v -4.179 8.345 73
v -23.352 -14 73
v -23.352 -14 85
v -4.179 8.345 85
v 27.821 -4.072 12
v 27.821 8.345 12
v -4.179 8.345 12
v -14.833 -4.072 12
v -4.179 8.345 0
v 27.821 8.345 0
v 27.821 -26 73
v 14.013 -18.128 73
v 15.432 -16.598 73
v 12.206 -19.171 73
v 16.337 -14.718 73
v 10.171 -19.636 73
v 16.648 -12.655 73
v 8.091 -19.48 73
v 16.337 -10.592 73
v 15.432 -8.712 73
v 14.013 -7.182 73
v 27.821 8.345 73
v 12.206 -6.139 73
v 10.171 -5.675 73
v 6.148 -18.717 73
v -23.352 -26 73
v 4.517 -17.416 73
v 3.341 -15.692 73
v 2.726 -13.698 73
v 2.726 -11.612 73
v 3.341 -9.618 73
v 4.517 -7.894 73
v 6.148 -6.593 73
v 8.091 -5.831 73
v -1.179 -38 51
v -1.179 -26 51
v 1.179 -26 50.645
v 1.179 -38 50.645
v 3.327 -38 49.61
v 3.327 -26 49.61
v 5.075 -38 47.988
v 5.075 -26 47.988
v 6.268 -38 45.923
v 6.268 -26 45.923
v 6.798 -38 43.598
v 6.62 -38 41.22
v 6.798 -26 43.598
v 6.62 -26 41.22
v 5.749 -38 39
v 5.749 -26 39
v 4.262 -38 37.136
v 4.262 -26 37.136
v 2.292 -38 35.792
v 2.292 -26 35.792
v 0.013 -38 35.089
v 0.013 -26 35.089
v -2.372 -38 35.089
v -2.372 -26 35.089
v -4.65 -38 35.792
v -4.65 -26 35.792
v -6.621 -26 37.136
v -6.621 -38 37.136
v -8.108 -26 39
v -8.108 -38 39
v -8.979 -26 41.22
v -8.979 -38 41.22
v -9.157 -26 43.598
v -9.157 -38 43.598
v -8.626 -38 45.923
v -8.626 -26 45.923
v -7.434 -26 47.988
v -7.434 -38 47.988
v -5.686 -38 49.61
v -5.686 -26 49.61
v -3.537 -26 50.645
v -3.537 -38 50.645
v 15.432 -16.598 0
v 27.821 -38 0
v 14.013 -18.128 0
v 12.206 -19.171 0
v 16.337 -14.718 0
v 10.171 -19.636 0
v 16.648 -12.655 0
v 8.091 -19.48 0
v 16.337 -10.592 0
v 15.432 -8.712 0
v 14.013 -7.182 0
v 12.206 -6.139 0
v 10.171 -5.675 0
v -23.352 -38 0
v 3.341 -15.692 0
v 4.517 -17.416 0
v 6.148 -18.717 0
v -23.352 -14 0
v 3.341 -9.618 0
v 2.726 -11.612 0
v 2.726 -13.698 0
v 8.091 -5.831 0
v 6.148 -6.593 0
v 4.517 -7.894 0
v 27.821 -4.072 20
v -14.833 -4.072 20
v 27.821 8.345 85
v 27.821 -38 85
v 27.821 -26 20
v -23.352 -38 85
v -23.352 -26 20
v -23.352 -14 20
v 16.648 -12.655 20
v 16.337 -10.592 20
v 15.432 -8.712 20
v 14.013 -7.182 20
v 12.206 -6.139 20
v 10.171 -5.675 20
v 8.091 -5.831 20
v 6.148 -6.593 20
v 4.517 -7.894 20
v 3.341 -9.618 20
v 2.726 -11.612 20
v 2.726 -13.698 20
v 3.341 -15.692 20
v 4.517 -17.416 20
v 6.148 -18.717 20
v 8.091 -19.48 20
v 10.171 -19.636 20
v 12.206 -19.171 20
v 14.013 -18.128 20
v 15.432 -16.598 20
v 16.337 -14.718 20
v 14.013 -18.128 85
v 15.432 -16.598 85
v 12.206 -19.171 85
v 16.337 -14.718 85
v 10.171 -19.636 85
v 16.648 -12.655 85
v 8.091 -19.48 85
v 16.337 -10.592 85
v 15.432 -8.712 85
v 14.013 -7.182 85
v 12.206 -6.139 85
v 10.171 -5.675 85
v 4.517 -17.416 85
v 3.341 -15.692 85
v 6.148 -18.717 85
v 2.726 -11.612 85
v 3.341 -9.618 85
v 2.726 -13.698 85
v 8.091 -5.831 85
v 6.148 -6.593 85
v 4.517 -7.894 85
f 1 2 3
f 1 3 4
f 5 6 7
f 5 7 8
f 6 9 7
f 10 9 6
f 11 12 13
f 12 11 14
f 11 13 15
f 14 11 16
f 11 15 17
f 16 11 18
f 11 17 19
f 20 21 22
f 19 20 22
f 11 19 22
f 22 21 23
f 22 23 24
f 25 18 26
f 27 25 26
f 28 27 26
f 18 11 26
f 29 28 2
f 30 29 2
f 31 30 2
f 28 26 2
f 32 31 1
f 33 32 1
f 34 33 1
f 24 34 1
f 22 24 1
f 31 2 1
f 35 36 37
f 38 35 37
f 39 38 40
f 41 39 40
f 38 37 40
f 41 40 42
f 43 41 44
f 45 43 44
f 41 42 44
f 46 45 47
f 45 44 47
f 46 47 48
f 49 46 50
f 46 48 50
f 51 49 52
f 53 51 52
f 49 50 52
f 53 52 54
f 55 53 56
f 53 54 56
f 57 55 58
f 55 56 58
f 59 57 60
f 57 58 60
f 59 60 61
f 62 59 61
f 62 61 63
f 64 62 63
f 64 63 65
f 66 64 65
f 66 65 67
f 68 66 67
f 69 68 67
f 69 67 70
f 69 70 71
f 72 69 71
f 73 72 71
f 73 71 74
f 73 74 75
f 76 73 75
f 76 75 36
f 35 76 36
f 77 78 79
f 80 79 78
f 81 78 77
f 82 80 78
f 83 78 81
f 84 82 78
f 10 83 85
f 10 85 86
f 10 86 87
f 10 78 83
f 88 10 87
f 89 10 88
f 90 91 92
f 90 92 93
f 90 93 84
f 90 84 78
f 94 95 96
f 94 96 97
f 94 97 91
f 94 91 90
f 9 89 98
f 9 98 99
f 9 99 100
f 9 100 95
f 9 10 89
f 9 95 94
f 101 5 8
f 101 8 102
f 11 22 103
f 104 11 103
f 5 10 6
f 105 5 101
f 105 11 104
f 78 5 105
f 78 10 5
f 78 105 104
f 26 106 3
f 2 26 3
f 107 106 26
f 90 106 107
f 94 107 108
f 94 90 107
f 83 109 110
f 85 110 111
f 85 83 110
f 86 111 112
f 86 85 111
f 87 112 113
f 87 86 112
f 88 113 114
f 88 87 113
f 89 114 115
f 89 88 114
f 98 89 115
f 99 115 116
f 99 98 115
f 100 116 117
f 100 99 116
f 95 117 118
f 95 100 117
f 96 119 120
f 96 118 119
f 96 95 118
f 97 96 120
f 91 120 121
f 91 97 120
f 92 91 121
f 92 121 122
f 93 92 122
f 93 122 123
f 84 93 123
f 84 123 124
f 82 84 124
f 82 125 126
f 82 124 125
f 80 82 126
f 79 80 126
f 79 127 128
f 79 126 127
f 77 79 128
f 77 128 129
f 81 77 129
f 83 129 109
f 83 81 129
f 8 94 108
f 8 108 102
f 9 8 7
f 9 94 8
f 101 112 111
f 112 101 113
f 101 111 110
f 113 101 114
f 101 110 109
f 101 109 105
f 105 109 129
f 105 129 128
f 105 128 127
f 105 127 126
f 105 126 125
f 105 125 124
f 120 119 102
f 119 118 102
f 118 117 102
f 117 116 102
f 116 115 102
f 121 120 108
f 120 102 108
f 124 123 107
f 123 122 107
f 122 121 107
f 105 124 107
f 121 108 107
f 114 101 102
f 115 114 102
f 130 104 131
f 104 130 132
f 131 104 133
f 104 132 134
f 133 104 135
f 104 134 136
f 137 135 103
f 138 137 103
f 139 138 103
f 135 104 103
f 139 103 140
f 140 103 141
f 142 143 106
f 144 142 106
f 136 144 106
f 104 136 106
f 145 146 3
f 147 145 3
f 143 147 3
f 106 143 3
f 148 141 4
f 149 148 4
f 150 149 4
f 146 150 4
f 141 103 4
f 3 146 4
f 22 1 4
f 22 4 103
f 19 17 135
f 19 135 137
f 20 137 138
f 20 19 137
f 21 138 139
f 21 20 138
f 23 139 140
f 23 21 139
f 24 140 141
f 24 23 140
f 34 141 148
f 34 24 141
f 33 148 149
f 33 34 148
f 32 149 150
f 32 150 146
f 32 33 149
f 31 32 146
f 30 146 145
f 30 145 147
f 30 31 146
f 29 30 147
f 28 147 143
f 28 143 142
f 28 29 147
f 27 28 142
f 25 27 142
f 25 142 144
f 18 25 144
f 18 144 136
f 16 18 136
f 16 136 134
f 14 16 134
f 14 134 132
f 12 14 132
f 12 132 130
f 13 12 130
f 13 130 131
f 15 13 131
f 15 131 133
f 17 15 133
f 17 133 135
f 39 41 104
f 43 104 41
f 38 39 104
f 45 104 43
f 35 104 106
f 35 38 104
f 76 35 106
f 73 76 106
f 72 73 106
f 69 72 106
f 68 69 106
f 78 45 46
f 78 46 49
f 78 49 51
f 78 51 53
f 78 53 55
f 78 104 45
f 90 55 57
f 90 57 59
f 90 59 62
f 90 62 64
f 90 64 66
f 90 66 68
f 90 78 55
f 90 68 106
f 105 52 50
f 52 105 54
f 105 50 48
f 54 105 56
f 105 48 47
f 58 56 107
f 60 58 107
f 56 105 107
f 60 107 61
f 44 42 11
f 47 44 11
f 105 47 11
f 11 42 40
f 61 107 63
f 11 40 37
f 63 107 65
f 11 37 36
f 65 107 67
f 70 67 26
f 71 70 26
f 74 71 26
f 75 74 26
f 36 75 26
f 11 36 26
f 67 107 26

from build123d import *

# Parameters (mm, degrees)
SKETCH_1_R          = 7
EXTRUDE_1_DEPTH     = 85
CUT_EXTRUDE_1_DEPTH = 107.24319241
SKETCH_3_R          = 8
CUT_EXTRUDE_2_DEPTH = 96.804760434


with BuildPart() as part:
    # 스케치1 → 보스-돌출1 (new body)
    with BuildSketch(Plane.XY):
        Polygon((-23.351828972, -14), (-4.179415178, 8.344827586), (27.820584822, 8.344827586), (27.820584822, -38), (-23.351828972, -38), align=None)
        with Locations((9.648171028, -12.655172414)):
            Circle(SKETCH_1_R, mode=Mode.SUBTRACT)
    extrude(amount=EXTRUDE_1_DEPTH)

    # 스케치2 → 컷-돌출1 (cut, through all)
    with BuildSketch(Plane.ZY.offset(23.351828972)):
        Polygon((12, 8.344827586), (12, -4.071985155), (20, -4.071985155), (20, -26), (73, -26), (73, 8.344827586), align=None)
    extrude(amount=-CUT_EXTRUDE_1_DEPTH, mode=Mode.SUBTRACT)

    # 스케치3 → 컷-돌출2 (cut, through all)
    with BuildSketch(Plane(origin=(0, -26, 0), x_dir=(1, 0, 0), z_dir=(0, 1, 0))):
        with Locations(Location((-1.179415178, -43, 0), (0, 0, 270))):
            Circle(SKETCH_3_R)
    extrude(amount=-CUT_EXTRUDE_2_DEPTH, mode=Mode.SUBTRACT)


solid = part.part
